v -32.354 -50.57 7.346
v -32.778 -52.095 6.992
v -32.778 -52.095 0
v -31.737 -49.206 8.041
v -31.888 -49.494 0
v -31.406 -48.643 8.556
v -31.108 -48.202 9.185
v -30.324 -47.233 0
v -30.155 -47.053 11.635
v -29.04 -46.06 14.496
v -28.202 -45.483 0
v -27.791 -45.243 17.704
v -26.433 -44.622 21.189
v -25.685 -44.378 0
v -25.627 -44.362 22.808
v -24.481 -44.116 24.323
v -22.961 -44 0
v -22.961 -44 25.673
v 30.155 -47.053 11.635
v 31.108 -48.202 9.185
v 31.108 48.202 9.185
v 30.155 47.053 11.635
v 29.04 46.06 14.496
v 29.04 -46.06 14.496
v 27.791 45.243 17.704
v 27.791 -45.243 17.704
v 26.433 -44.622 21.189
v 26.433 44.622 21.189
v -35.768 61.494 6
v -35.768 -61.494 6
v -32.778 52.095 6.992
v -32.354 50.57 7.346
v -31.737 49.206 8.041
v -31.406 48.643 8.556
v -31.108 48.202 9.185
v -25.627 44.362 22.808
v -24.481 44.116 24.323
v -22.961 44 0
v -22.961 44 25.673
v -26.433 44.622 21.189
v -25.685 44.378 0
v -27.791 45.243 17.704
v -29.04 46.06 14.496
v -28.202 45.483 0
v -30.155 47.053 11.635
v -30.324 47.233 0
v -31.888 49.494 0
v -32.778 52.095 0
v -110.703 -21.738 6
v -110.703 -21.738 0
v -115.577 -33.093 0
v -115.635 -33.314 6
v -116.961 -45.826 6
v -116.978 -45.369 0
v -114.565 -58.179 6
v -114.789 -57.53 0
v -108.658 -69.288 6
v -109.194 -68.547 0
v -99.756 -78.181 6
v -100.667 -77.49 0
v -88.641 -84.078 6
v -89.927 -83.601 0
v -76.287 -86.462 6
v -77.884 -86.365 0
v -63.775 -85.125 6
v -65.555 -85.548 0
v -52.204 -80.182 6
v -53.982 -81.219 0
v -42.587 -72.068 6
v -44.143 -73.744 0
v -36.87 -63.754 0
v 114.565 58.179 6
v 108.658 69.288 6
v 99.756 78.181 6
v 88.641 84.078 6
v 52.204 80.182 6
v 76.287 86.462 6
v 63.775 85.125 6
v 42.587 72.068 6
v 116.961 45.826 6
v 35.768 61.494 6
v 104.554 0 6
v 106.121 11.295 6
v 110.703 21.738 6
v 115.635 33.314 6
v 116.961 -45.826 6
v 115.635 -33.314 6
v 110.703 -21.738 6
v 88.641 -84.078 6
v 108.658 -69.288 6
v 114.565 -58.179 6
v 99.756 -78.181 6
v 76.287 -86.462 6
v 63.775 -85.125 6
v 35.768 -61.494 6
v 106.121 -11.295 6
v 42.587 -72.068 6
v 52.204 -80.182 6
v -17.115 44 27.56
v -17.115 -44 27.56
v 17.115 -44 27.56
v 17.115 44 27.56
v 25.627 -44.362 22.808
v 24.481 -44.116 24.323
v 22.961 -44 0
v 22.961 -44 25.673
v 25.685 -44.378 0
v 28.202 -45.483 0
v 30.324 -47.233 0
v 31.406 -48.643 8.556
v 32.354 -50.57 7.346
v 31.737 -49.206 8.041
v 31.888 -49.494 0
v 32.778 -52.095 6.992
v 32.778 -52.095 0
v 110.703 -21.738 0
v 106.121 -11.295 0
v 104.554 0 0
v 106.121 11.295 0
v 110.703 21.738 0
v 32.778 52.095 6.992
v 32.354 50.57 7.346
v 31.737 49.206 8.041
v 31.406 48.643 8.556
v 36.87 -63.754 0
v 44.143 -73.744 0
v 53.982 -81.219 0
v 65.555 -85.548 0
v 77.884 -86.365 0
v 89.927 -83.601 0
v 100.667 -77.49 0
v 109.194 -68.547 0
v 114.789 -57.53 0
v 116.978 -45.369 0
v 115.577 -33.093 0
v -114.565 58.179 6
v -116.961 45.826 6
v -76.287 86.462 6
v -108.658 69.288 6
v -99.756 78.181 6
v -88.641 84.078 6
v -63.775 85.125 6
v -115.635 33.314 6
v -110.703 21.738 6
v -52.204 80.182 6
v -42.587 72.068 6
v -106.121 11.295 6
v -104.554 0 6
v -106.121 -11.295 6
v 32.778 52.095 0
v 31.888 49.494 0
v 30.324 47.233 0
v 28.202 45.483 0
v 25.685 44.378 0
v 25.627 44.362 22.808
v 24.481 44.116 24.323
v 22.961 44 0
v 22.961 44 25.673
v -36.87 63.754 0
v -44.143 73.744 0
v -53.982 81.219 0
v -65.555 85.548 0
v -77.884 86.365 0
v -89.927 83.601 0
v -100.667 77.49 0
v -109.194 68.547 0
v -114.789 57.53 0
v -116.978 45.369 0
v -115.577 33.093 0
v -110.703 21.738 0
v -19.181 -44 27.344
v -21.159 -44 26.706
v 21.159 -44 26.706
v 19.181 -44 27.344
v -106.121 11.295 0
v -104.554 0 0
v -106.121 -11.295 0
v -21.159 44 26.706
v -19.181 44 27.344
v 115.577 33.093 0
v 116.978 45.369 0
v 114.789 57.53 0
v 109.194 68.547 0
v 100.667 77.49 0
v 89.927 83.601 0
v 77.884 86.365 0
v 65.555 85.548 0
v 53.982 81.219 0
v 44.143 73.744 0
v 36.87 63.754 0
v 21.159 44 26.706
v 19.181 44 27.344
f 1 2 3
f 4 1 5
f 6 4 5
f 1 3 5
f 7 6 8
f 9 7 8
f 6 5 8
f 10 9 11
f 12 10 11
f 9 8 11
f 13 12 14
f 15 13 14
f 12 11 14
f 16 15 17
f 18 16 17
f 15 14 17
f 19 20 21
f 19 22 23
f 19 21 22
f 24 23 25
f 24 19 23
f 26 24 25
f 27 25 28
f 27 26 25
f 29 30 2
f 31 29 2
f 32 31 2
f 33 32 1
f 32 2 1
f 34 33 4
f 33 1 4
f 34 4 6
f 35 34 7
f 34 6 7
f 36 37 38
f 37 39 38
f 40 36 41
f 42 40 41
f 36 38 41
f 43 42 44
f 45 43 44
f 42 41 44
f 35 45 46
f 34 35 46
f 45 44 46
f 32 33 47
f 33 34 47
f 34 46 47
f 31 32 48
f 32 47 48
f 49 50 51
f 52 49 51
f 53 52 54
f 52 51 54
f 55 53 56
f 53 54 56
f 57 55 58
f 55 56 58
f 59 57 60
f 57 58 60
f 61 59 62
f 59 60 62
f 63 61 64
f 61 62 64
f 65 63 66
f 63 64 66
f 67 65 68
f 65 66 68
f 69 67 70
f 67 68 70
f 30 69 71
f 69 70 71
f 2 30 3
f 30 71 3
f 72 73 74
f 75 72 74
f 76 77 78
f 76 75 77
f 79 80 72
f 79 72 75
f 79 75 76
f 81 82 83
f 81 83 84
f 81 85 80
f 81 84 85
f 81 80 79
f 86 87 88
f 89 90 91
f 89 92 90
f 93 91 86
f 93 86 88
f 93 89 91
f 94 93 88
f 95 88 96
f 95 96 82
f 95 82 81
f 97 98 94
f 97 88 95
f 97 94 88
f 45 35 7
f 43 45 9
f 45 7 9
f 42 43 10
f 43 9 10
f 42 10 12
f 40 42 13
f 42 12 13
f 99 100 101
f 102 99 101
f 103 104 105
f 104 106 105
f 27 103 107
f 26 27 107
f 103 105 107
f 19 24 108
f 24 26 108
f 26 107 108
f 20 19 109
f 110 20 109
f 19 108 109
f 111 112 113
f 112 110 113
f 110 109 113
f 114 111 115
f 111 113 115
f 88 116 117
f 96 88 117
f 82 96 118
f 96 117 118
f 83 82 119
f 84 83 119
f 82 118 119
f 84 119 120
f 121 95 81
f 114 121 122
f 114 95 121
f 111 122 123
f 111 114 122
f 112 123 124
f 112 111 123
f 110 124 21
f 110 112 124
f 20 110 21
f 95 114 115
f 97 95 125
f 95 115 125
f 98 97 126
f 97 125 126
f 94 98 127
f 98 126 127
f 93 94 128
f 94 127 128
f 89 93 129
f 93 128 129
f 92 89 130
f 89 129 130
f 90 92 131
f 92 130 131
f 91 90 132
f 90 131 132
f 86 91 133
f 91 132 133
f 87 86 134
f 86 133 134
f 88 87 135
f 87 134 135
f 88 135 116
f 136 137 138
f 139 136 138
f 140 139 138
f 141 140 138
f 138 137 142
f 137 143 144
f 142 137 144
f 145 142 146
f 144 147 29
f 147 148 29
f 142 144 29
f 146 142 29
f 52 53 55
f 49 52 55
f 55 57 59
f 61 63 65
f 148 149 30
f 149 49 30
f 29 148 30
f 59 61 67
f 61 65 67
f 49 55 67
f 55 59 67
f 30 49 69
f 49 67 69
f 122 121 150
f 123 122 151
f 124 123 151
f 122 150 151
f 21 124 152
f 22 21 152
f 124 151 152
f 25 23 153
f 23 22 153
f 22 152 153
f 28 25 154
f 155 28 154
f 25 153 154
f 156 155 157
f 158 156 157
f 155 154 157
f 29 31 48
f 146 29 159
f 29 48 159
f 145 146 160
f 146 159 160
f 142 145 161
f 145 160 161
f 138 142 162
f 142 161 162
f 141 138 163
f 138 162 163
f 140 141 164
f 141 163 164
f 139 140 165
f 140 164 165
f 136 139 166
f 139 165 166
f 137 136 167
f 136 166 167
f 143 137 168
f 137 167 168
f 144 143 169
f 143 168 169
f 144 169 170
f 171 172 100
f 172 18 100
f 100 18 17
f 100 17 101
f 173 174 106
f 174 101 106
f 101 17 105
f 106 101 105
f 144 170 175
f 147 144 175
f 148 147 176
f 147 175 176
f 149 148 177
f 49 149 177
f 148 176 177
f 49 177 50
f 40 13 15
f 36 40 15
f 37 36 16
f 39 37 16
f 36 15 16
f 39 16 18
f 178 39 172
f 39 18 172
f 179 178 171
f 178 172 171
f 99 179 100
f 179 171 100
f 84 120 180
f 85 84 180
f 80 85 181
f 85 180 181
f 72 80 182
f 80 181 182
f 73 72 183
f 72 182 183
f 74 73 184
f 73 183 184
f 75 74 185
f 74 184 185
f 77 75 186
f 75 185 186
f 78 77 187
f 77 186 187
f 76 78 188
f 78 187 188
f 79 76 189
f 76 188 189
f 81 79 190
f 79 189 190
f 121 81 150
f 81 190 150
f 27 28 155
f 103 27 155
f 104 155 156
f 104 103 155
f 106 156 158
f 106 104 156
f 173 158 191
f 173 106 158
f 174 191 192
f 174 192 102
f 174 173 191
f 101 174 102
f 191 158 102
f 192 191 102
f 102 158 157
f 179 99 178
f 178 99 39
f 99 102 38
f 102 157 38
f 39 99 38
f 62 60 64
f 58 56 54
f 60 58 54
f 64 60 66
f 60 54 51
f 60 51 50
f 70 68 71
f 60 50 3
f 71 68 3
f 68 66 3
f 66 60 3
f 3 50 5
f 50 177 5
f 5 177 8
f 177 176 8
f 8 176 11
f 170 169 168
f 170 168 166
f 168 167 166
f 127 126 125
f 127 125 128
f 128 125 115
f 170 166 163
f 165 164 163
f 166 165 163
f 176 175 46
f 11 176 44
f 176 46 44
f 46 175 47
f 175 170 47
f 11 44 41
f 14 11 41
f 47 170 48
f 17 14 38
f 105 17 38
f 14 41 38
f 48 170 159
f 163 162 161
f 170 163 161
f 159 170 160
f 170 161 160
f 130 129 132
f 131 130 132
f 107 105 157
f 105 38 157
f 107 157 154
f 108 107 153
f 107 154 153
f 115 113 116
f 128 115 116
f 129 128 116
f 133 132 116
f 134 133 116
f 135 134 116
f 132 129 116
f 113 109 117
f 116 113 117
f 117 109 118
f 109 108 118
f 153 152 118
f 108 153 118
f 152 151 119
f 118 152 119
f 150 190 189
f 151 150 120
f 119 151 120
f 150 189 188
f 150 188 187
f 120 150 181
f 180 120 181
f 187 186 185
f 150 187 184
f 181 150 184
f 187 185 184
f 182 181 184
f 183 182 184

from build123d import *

# Parameters (mm, degrees)
BOSS_EXTRUDE1_DEPTH     = 27.56
CUT_EXTRUDE1_DEPTH      = 149.090525018
CUT_EXTRUDE1_DEPTH_BACK = 149.090525018


with BuildPart() as part:
    # Sketch1 → Boss-Extrude1 (new body)
    with BuildSketch(Plane.XY):
        with BuildLine():
            Line((22.96117968, 44), (-22.96117968, 44))
            ThreePointArc((-22.96117968, 44), (-29.323269783, 46.284832502), (-32.778097836, 52.095238095))
            ThreePointArc((-32.778097836, 52.095238095), (-89.927364847, 83.601091069), (-110.70300535, 21.738095238))
            ThreePointArc((-110.70300535, 21.738095238), (-104.55417528, 0), (-110.70300535, -21.738095238))
            ThreePointArc((-110.70300535, -21.738095238), (-89.927364847, -83.601091069), (-32.778097836, -52.095238095))
            ThreePointArc((-32.778097836, -52.095238095), (-29.323269783, -46.284832502), (-22.96117968, -44))
            Line((-22.96117968, -44), (22.96117968, -44))
            ThreePointArc((22.96117968, -44), (29.323269783, -46.284832502), (32.778097836, -52.095238095))
            ThreePointArc((32.778097836, -52.095238095), (89.927364847, -83.601091069), (110.70300535, -21.738095238))
            ThreePointArc((110.70300535, -21.738095238), (104.55417528, 0), (110.70300535, 21.738095238))
            ThreePointArc((110.70300535, 21.738095238), (89.927364847, 83.601091069), (32.778097836, 52.095238095))
            ThreePointArc((32.778097836, 52.095238095), (29.323269783, 46.284832502), (22.96117968, 44))
        make_face()
    extrude(amount=BOSS_EXTRUDE1_DEPTH)

    # Sketch2 → Cut-Extrude1 (cut, two sides: drawn at the far end of the back side and taken through both)
    with BuildSketch(Plane(origin=(0, 0, 0), x_dir=(1, 0, 0), z_dir=(0, 1, 0)).offset(-CUT_EXTRUDE1_DEPTH_BACK)):
        with BuildLine():
            Line((117, -6), (35.767564174, -6))
            ThreePointArc((35.767564174, -6), (32.945610035, -6.872461407), (31.108474327, -9.185370066))
            Line((31.108474327, -9.185370066), (26.433179694, -21.189259868))
            ThreePointArc((26.433179694, -21.189259868), (22.758908279, -25.815077185), (17.115, -27.56))
            Line((17.115, -27.56), (117, -27.56))
            Line((117, -27.56), (117, -6))
        make_face()
        with BuildLine():
            Line((-117, -27.56), (-117, -6))
            Line((-117, -6), (-35.767564174, -6))
            ThreePointArc((-35.767564174, -6), (-32.945610035, -6.872461407), (-31.108474327, -9.185370066))
            Line((-31.108474327, -9.185370066), (-26.433179694, -21.189259868))
            ThreePointArc((-26.433179694, -21.189259868), (-22.758908279, -25.815077185), (-17.115, -27.56))
            Line((-17.115, -27.56), (-117, -27.56))
        make_face()
    extrude(amount=CUT_EXTRUDE1_DEPTH + CUT_EXTRUDE1_DEPTH_BACK, mode=Mode.SUBTRACT)


solid = part.part
